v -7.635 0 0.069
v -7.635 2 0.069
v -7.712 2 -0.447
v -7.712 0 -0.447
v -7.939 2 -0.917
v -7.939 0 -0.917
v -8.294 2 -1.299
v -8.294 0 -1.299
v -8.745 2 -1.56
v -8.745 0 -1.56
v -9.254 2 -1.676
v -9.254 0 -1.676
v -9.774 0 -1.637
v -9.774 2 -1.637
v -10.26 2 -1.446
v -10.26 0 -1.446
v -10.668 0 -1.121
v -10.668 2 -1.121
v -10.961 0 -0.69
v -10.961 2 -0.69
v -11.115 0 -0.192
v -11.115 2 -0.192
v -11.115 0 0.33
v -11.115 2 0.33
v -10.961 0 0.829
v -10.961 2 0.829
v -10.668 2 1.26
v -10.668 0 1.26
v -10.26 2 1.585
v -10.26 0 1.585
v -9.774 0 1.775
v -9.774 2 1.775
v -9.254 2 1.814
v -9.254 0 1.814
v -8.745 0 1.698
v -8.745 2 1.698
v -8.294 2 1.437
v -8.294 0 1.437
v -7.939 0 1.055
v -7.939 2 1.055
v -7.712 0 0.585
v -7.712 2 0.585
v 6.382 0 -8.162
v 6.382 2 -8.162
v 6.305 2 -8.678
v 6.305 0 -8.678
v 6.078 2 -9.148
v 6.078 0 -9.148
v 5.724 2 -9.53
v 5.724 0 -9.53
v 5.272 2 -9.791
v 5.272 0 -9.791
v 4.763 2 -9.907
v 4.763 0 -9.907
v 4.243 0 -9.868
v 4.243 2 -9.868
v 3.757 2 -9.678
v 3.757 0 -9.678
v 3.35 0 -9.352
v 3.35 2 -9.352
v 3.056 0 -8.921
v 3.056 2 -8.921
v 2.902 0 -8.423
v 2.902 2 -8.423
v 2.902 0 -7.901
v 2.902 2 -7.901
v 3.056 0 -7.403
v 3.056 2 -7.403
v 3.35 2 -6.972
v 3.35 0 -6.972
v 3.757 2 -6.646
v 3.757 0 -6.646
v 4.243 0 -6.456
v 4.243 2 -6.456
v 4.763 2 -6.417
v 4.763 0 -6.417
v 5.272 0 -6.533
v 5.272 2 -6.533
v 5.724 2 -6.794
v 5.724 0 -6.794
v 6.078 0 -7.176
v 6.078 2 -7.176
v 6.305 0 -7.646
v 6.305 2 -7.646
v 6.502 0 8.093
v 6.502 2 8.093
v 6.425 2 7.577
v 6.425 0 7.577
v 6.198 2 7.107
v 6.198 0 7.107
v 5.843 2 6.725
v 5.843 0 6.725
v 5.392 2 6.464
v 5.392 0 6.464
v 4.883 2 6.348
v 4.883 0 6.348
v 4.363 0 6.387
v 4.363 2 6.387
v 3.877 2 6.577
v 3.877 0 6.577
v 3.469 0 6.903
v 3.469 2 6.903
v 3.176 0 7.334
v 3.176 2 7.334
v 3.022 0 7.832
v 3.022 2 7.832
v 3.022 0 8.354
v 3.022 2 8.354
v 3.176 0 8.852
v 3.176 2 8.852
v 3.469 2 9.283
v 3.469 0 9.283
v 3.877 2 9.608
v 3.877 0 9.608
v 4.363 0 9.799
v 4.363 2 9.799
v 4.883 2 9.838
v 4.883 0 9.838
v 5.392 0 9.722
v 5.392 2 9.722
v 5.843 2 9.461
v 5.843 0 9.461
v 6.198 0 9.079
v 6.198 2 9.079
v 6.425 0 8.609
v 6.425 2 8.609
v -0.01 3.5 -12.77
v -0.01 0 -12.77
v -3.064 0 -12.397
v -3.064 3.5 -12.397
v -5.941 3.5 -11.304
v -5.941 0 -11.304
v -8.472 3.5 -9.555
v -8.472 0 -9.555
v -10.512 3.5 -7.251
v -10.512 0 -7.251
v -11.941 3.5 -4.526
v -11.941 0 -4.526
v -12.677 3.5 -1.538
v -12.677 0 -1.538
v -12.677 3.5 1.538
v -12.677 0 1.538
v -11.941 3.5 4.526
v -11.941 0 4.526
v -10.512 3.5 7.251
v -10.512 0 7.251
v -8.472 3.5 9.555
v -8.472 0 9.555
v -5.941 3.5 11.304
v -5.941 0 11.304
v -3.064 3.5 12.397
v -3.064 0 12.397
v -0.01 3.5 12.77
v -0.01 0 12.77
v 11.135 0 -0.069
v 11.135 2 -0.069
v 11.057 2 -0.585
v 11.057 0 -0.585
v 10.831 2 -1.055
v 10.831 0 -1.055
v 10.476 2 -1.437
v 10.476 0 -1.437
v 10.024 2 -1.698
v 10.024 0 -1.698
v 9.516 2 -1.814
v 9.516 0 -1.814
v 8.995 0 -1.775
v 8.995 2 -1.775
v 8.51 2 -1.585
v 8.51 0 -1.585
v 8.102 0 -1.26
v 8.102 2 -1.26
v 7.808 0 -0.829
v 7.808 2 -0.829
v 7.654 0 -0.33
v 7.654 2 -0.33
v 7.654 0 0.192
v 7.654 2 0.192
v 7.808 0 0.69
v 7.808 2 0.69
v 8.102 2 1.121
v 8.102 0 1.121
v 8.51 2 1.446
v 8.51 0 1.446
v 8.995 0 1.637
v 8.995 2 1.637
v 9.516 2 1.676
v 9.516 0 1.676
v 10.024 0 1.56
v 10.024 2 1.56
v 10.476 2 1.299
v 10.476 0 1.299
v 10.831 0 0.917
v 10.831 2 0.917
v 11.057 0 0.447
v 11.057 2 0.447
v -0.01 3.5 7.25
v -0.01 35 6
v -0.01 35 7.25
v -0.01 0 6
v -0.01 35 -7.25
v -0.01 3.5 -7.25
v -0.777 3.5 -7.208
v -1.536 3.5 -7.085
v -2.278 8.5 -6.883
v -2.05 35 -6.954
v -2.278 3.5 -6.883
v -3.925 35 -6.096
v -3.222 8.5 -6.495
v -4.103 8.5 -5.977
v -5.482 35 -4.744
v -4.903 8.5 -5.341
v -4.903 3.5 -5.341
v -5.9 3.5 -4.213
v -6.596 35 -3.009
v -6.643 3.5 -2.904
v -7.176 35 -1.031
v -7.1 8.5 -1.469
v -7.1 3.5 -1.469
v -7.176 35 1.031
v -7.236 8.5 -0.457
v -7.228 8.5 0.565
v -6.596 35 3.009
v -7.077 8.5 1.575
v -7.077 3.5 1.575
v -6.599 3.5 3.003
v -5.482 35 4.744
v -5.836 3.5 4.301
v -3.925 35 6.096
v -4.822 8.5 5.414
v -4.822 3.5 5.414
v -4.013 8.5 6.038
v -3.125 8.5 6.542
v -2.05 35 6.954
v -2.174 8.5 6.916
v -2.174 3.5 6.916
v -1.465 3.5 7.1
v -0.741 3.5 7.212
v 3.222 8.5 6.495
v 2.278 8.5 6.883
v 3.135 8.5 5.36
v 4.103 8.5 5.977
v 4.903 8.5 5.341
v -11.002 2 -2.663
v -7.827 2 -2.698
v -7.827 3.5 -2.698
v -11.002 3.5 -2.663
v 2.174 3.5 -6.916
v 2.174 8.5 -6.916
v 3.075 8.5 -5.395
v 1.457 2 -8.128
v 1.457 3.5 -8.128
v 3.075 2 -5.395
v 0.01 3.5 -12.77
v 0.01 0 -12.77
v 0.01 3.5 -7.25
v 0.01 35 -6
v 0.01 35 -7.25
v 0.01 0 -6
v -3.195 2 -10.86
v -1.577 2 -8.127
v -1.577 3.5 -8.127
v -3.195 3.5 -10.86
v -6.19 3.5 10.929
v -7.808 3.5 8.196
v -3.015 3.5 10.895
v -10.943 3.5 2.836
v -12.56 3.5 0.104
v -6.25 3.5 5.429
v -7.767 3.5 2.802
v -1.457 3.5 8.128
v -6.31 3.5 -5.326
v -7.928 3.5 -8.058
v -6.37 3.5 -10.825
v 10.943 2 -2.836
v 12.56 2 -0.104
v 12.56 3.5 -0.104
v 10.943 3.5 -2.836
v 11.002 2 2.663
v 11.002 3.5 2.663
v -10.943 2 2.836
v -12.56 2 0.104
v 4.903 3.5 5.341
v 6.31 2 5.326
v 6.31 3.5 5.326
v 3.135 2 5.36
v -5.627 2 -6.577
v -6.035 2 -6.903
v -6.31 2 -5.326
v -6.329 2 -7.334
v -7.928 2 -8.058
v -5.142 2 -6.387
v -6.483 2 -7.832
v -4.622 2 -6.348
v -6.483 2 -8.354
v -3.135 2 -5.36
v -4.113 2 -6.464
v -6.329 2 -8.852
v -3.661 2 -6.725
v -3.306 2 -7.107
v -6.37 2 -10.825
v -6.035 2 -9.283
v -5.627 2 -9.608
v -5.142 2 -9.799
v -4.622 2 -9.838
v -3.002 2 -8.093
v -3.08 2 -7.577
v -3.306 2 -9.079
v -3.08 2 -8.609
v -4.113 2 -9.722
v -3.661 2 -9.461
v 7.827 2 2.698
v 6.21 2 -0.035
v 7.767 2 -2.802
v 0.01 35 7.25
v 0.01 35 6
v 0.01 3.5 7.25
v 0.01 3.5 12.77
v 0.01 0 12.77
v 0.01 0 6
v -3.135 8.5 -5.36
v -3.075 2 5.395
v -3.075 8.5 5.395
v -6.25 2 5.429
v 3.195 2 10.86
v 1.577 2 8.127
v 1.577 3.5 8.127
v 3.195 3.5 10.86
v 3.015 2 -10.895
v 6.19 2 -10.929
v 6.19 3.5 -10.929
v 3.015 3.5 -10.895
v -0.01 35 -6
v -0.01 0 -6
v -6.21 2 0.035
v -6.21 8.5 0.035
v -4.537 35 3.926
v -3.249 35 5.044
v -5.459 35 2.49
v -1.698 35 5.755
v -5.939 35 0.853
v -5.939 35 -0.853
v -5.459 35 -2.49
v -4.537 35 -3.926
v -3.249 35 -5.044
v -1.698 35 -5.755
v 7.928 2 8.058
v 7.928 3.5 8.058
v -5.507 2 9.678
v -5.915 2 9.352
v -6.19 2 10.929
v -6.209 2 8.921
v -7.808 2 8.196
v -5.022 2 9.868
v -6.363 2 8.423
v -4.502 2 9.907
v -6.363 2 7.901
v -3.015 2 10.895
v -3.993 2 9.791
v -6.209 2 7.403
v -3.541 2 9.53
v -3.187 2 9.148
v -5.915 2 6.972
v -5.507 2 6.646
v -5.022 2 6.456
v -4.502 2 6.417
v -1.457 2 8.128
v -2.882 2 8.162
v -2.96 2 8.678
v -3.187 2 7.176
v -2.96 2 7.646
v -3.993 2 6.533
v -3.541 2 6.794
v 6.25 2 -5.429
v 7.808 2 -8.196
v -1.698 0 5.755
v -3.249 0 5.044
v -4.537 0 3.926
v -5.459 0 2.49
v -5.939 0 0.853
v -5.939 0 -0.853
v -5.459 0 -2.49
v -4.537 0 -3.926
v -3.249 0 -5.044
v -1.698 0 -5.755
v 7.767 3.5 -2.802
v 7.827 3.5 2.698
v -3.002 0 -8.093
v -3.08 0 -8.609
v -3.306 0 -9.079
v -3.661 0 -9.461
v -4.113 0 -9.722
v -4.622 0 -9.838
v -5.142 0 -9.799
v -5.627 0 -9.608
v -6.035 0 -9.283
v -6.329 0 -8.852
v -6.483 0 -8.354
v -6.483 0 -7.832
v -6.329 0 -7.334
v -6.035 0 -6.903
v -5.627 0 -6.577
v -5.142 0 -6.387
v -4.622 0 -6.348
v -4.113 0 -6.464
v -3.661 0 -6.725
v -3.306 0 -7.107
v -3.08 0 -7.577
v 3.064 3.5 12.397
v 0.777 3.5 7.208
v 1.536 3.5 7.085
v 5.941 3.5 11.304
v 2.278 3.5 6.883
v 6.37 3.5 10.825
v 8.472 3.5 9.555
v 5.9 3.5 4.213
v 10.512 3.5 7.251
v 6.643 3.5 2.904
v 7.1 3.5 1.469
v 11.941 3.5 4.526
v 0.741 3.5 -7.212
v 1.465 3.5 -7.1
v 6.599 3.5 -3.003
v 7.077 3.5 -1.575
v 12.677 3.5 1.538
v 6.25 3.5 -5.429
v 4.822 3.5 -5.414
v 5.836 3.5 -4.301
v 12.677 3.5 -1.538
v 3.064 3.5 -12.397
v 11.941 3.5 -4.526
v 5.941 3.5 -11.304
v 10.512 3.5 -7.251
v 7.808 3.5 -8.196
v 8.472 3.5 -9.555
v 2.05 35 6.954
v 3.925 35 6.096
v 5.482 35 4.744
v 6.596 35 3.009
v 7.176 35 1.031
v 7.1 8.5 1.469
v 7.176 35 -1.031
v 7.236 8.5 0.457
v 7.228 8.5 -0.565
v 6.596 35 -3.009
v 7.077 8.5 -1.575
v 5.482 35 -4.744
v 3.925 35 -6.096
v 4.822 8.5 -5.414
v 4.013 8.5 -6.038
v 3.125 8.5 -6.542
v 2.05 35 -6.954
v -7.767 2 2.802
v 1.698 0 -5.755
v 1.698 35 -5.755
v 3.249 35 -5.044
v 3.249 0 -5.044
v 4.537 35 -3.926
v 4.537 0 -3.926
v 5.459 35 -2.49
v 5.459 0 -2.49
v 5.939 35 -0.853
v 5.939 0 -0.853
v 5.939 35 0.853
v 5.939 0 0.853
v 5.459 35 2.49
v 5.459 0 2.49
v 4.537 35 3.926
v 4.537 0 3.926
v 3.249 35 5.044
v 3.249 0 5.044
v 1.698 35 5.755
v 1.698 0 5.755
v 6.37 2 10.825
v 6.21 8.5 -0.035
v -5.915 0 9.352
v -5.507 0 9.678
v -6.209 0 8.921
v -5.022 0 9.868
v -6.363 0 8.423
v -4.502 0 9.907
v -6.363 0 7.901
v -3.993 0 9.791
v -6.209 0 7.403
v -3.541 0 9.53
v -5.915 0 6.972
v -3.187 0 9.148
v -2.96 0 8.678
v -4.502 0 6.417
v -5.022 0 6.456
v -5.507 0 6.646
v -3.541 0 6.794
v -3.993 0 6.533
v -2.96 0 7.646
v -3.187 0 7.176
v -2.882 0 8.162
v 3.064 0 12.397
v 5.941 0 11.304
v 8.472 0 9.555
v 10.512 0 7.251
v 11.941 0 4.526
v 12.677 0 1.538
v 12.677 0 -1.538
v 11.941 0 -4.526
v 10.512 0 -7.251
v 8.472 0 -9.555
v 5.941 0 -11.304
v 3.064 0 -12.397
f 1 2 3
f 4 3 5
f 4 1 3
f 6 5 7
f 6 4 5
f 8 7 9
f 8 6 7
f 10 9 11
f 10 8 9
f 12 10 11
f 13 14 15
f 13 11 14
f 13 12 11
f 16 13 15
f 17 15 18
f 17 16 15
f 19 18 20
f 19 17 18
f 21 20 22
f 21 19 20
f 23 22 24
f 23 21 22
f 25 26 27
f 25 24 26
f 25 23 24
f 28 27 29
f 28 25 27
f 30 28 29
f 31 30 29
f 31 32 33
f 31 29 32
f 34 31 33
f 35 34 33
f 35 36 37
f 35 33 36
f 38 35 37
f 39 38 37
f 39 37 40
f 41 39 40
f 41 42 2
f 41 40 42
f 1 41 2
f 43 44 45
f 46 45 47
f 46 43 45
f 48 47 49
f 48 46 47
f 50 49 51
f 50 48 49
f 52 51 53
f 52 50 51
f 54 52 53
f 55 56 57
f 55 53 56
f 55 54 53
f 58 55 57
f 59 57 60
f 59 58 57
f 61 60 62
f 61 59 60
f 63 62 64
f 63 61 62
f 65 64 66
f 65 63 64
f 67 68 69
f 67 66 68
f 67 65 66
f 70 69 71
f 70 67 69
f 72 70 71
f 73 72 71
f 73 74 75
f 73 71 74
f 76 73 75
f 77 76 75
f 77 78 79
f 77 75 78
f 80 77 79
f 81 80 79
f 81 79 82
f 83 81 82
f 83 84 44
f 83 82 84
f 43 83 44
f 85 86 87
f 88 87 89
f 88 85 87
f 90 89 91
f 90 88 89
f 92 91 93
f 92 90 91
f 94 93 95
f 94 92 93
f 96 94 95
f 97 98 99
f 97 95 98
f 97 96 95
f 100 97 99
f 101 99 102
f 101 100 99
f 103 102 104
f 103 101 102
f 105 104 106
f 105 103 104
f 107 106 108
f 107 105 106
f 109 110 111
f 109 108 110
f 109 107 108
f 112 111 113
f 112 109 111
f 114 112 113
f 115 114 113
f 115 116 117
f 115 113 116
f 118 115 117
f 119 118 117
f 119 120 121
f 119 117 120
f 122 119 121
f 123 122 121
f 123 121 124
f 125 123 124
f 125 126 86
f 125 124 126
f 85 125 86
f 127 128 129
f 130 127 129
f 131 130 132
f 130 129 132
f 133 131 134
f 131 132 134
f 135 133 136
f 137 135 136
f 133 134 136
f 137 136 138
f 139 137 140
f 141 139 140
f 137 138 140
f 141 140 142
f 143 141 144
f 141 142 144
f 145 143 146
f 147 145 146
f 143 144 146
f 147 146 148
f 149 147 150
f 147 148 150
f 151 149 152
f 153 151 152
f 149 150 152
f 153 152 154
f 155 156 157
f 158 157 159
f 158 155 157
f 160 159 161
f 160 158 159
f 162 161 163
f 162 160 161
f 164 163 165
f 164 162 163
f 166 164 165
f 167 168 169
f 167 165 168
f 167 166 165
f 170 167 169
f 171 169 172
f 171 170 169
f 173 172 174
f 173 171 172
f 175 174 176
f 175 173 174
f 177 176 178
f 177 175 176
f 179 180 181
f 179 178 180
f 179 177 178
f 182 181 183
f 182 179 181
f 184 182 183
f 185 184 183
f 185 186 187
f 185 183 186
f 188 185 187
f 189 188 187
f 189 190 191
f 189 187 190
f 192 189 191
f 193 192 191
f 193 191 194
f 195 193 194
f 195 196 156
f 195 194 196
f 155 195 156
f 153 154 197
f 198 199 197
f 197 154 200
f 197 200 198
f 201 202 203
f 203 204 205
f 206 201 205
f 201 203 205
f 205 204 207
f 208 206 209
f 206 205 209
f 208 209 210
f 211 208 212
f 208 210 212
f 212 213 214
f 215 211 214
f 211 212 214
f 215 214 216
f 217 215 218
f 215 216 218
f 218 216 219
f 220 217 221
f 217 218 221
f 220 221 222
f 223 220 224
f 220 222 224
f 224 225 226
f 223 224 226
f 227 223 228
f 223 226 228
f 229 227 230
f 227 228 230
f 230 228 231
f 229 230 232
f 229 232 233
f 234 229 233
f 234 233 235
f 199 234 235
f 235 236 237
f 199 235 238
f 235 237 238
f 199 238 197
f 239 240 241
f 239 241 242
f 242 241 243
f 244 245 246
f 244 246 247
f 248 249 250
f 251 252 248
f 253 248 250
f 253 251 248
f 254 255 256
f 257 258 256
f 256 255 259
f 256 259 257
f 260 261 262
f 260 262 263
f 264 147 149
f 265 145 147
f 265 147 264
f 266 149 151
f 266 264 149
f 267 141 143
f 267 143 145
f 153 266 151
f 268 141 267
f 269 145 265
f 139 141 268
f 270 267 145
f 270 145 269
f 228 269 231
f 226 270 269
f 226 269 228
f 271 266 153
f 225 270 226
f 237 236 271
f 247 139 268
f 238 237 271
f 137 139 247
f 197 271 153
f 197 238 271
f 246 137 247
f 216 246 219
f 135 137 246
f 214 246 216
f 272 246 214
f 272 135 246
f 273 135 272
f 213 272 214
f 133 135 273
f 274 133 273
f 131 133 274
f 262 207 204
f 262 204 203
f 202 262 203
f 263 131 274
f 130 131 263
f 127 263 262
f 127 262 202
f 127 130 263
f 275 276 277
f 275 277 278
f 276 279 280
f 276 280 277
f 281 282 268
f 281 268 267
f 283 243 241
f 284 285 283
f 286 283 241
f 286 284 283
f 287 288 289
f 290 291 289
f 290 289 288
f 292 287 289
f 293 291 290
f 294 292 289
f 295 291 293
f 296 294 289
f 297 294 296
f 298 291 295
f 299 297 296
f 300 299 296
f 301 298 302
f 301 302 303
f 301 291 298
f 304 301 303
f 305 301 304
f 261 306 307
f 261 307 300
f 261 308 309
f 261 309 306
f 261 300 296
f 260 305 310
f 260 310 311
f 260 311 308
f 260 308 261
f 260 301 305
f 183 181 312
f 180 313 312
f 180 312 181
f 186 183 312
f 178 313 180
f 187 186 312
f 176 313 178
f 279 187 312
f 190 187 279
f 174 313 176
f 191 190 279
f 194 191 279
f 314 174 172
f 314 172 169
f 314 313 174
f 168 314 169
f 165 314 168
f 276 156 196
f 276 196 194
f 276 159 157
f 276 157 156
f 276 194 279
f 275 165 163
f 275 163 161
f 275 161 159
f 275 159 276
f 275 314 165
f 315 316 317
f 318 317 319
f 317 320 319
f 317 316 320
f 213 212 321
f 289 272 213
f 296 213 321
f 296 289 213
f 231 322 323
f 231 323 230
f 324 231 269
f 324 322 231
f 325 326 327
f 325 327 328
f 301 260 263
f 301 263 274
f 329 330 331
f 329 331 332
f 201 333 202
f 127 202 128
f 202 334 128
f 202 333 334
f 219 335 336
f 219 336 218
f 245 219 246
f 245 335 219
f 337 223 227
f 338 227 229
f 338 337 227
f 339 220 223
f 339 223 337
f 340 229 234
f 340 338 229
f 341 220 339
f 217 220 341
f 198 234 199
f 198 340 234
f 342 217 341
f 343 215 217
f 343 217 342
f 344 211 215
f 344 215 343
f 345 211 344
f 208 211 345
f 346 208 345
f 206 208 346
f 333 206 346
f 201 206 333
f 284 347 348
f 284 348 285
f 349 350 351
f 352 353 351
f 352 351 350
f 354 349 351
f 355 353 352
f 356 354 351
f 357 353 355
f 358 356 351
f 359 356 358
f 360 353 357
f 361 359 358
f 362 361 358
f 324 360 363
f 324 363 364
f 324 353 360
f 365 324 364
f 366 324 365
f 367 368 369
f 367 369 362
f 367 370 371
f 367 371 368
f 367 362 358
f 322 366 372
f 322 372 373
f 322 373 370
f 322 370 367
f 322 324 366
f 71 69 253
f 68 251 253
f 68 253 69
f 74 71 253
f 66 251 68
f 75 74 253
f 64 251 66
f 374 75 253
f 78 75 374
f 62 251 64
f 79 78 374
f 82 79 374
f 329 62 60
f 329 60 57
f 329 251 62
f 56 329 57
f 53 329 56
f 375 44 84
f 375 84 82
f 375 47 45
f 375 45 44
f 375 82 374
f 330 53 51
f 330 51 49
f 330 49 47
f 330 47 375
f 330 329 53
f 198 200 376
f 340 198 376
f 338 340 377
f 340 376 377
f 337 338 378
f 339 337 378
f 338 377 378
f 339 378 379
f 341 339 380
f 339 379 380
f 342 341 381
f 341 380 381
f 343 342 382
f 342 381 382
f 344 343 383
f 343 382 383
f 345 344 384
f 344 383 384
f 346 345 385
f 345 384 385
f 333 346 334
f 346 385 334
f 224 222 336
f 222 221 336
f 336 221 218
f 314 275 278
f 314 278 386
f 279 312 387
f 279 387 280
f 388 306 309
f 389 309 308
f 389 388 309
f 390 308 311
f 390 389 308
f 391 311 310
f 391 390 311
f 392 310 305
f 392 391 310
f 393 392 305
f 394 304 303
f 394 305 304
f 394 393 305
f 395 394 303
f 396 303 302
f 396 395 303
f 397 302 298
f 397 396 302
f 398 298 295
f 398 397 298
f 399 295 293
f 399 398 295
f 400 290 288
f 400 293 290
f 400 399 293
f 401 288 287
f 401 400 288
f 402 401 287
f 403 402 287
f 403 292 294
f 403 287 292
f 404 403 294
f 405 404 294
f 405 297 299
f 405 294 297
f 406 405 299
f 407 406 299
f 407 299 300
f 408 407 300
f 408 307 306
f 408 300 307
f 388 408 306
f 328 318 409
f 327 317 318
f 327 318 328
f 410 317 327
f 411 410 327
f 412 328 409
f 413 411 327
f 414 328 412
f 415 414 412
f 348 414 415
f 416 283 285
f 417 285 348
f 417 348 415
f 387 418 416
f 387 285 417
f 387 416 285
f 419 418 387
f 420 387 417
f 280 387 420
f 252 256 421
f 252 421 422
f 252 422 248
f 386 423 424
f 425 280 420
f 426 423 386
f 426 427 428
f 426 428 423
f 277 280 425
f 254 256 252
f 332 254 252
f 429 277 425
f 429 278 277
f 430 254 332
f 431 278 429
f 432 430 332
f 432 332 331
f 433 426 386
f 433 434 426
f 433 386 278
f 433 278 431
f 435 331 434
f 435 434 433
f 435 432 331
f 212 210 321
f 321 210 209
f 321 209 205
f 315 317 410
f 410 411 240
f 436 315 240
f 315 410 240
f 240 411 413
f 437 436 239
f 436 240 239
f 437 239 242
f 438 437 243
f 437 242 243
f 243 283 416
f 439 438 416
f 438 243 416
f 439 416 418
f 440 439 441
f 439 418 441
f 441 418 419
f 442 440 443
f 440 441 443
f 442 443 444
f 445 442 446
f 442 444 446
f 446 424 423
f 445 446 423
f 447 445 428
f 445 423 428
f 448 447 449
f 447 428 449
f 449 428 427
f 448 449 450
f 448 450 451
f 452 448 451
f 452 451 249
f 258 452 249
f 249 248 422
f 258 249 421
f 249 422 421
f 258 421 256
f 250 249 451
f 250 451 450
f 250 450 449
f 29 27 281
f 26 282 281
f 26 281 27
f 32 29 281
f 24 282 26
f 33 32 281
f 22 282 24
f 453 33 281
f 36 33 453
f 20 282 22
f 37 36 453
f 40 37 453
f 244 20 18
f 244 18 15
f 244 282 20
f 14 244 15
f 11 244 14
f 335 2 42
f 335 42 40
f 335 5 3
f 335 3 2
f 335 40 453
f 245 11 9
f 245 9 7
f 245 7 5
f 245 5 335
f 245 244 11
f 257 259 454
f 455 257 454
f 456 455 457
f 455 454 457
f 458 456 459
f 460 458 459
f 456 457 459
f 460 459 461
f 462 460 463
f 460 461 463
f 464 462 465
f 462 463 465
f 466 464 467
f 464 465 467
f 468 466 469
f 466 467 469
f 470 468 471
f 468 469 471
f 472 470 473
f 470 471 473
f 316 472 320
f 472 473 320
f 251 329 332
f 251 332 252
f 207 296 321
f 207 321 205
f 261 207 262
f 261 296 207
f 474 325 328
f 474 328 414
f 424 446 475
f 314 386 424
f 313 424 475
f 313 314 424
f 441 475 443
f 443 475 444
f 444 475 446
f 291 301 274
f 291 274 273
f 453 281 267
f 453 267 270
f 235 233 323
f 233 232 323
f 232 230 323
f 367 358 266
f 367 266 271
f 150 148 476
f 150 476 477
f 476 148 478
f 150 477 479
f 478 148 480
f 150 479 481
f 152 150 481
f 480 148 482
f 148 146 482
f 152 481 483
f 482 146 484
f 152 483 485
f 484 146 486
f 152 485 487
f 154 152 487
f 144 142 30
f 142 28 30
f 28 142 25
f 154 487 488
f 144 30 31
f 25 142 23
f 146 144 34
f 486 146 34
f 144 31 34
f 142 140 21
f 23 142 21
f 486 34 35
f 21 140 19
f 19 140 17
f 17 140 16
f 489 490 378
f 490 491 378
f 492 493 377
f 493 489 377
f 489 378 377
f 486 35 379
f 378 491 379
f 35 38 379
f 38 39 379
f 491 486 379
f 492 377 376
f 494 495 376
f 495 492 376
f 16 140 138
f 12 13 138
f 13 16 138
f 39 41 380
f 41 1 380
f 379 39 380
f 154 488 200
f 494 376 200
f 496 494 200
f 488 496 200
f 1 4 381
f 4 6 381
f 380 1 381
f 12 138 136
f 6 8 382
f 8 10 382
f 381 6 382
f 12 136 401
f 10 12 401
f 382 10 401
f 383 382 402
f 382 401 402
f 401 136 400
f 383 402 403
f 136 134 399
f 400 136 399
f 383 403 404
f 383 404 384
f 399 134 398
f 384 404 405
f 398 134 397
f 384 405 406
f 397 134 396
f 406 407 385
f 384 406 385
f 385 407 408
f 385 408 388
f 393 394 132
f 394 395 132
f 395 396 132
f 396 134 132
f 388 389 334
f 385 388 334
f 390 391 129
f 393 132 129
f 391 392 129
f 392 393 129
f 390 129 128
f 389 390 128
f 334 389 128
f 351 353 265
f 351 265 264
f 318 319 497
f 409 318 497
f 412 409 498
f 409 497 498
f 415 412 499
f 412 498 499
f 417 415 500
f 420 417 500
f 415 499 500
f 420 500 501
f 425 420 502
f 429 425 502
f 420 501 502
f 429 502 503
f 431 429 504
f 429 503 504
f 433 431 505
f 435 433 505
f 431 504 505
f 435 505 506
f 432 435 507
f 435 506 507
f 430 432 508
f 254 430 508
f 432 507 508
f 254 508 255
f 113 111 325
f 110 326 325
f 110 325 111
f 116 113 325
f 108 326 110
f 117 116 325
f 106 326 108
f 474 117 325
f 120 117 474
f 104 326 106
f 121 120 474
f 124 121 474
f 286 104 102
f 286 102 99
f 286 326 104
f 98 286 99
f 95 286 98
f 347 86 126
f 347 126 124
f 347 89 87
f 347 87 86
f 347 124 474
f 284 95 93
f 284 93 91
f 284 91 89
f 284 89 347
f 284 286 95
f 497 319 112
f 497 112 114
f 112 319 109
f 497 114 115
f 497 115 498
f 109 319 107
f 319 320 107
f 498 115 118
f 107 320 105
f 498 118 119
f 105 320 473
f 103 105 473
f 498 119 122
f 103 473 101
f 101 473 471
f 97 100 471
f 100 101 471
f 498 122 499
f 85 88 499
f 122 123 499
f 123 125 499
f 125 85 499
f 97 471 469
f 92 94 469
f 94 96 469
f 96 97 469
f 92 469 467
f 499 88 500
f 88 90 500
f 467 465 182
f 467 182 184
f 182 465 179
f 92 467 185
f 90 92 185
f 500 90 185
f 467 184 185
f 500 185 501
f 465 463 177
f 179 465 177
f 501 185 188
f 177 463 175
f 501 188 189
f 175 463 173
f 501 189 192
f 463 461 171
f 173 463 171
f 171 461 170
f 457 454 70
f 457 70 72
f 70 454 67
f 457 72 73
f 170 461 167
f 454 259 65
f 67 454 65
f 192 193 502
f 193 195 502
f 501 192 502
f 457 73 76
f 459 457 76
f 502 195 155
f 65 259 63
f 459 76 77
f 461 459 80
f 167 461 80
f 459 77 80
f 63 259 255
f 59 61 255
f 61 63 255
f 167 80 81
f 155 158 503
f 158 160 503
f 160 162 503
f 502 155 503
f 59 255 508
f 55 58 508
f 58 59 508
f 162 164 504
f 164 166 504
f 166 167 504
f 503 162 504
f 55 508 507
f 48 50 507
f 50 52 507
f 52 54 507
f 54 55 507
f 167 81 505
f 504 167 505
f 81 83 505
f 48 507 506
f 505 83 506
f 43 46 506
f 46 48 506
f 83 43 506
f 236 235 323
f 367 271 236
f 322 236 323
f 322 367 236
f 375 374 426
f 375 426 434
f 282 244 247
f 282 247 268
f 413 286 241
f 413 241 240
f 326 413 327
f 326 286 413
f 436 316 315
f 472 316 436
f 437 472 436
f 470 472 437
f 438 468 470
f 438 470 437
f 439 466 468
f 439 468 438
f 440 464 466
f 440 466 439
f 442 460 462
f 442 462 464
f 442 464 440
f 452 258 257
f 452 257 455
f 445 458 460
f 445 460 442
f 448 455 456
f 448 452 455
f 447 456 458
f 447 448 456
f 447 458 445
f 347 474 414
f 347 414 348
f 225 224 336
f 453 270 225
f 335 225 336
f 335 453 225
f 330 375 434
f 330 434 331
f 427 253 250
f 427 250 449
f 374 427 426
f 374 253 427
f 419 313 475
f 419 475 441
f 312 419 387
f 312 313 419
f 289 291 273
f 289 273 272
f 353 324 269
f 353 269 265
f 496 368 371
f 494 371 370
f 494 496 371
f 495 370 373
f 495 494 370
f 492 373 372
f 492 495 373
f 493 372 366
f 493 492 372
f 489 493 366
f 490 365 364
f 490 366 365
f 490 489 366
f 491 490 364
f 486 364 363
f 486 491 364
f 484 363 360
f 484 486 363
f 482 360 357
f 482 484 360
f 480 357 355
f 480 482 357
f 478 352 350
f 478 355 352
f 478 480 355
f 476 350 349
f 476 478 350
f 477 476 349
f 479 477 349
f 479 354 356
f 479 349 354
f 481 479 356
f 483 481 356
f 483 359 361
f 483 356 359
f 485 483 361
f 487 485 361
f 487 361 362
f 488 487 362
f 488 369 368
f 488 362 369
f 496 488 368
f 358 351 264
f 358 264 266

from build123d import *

# Parameters (mm, degrees)
BOSS_EXTRUDE1_OUTLINE_R = 1.75
BOSS_EXTRUDE1_DEPTH     = 3.5
BOSS_EXTRUDE2_DEPTH     = 35
CUT_EXTRUDE1_DEPTH      = 5
CUT_EXTRUDE1_DEPTH_BACK = 1.5


# Read off the part's stored shape, not the designer's step: Boss-Extrude1
with BuildPart() as part:
    # Boss-Extrude1 outline → Boss-Extrude1 (new body)
    # profile 1 of 2: a face of its own
    with BuildSketch(Plane(origin=(0, 0, 0), x_dir=(1, 0, 0), z_dir=(0, 1, 0))):
        with BuildLine():
            Line((-0.01, 5.999991667), (-0.01, 12.769996085))
            ThreePointArc((-0.01, 12.769996085), (-12.77, 0), (-0.01, -12.769996085))
            Line((-0.01, -12.769996085), (-0.01, -5.999991667))
            ThreePointArc((-0.01, -5.999991667), (-6, 0), (-0.01, 5.999991667))
        make_face()
        with Locations((-4.632438453, -8.162030322)):
            Circle(BOSS_EXTRUDE1_OUTLINE_R, mode=Mode.SUBTRACT)
        with Locations((-9.384744832, -0.069205779)):
            Circle(BOSS_EXTRUDE1_OUTLINE_R, mode=Mode.SUBTRACT)
        with Locations((-4.752306379, 8.092824543)):
            Circle(BOSS_EXTRUDE1_OUTLINE_R, mode=Mode.SUBTRACT)
    # profile 2 of 2: a face of its own
    with BuildSketch(Plane(origin=(0, 0, 0), x_dir=(1, 0, 0), z_dir=(0, 1, 0))):
        with BuildLine():
            ThreePointArc((0.01, 5.999991667), (6, 0), (0.01, -5.999991667))
            Line((0.01, -5.999991667), (0.01, -12.769996085))
            ThreePointArc((0.01, -12.769996085), (12.77, 0), (0.01, 12.769996085))
            Line((0.01, 12.769996085), (0.01, 5.999991667))
        make_face()
        with Locations((4.752306379, -8.092824543)):
            Circle(BOSS_EXTRUDE1_OUTLINE_R, mode=Mode.SUBTRACT)
        with Locations((9.384744832, 0.069205779)):
            Circle(BOSS_EXTRUDE1_OUTLINE_R, mode=Mode.SUBTRACT)
        with Locations((4.632438453, 8.162030322)):
            Circle(BOSS_EXTRUDE1_OUTLINE_R, mode=Mode.SUBTRACT)
    extrude(amount=BOSS_EXTRUDE1_DEPTH)

    # Sketch2<3> → Boss-Extrude2 (add)
    with BuildSketch(Plane(origin=(0, 0, 0), x_dir=(1, 0, 0), z_dir=(0, 1, 0))):
        with BuildLine():
            ThreePointArc((-0.01, -5.999991667), (-6, 0), (-0.01, 5.999991667))
            Line((-0.01, 5.999991667), (-0.01, 7.249993103))
            ThreePointArc((-0.01, 7.249993103), (-7.25, 0), (-0.01, -7.249993103))
            Line((-0.01, -7.249993103), (-0.01, -5.999991667))
        make_face()
        with BuildLine():
            Line((0.01, 7.249993103), (0.01, 5.999991667))
            ThreePointArc((0.01, 5.999991667), (6, 0), (0.01, -5.999991667))
            Line((0.01, -5.999991667), (0.01, -7.249993103))
            ThreePointArc((0.01, -7.249993103), (7.25, 0), (0.01, 7.249993103))
        make_face()
    extrude(amount=BOSS_EXTRUDE2_DEPTH)

    # Sketch3 → Cut-Extrude1 (cut, two sides: drawn at the far end of the back side and taken through both)
    with BuildSketch(Plane(origin=(0, 3.5, 0), x_dir=(1, 0, 0), z_dir=(0, 1, 0)).offset(-CUT_EXTRUDE1_DEPTH_BACK)):
        Polygon((6.249885019, 5.429412541), (7.807678154, 8.196471247), (6.190231587, 10.929089028), (3.014991887, 10.894648103), (1.457198752, 8.127589397), (3.074645319, 5.394971616), align=None)
        Polygon((-3.194513245, 10.859883249), (-6.369752945, 10.825442324), (-7.927546079, 8.058383618), (-6.310099513, 5.325765836), (-3.134859812, 5.360206762), (-1.577066678, 8.127265468), align=None)
        Polygon((7.826951698, -2.697852927), (11.002191398, -2.663412002), (12.559984532, 0.103646704), (10.942537966, 2.836264486), (7.767298265, 2.80182356), (6.209505131, 0.034764854), align=None)
        Polygon((1.577066678, -8.127265468), (3.194513245, -10.859883249), (6.369752945, -10.825442324), (7.927546079, -8.058383618), (6.310099513, -5.325765836), (3.134859812, -5.360206762), align=None)
        Polygon((-6.249885019, -5.429412541), (-7.807678154, -8.196471247), (-6.190231587, -10.929089028), (-3.014991887, -10.894648103), (-1.457198752, -8.127589397), (-3.074645319, -5.394971616), align=None)
        Polygon((-7.826951698, 2.697852927), (-11.002191398, 2.663412002), (-12.559984532, -0.103646704), (-10.942537966, -2.836264486), (-7.767298265, -2.80182356), (-6.209505131, -0.034764854), align=None)
    extrude(amount=CUT_EXTRUDE1_DEPTH + CUT_EXTRUDE1_DEPTH_BACK, mode=Mode.SUBTRACT)


solid = part.part
